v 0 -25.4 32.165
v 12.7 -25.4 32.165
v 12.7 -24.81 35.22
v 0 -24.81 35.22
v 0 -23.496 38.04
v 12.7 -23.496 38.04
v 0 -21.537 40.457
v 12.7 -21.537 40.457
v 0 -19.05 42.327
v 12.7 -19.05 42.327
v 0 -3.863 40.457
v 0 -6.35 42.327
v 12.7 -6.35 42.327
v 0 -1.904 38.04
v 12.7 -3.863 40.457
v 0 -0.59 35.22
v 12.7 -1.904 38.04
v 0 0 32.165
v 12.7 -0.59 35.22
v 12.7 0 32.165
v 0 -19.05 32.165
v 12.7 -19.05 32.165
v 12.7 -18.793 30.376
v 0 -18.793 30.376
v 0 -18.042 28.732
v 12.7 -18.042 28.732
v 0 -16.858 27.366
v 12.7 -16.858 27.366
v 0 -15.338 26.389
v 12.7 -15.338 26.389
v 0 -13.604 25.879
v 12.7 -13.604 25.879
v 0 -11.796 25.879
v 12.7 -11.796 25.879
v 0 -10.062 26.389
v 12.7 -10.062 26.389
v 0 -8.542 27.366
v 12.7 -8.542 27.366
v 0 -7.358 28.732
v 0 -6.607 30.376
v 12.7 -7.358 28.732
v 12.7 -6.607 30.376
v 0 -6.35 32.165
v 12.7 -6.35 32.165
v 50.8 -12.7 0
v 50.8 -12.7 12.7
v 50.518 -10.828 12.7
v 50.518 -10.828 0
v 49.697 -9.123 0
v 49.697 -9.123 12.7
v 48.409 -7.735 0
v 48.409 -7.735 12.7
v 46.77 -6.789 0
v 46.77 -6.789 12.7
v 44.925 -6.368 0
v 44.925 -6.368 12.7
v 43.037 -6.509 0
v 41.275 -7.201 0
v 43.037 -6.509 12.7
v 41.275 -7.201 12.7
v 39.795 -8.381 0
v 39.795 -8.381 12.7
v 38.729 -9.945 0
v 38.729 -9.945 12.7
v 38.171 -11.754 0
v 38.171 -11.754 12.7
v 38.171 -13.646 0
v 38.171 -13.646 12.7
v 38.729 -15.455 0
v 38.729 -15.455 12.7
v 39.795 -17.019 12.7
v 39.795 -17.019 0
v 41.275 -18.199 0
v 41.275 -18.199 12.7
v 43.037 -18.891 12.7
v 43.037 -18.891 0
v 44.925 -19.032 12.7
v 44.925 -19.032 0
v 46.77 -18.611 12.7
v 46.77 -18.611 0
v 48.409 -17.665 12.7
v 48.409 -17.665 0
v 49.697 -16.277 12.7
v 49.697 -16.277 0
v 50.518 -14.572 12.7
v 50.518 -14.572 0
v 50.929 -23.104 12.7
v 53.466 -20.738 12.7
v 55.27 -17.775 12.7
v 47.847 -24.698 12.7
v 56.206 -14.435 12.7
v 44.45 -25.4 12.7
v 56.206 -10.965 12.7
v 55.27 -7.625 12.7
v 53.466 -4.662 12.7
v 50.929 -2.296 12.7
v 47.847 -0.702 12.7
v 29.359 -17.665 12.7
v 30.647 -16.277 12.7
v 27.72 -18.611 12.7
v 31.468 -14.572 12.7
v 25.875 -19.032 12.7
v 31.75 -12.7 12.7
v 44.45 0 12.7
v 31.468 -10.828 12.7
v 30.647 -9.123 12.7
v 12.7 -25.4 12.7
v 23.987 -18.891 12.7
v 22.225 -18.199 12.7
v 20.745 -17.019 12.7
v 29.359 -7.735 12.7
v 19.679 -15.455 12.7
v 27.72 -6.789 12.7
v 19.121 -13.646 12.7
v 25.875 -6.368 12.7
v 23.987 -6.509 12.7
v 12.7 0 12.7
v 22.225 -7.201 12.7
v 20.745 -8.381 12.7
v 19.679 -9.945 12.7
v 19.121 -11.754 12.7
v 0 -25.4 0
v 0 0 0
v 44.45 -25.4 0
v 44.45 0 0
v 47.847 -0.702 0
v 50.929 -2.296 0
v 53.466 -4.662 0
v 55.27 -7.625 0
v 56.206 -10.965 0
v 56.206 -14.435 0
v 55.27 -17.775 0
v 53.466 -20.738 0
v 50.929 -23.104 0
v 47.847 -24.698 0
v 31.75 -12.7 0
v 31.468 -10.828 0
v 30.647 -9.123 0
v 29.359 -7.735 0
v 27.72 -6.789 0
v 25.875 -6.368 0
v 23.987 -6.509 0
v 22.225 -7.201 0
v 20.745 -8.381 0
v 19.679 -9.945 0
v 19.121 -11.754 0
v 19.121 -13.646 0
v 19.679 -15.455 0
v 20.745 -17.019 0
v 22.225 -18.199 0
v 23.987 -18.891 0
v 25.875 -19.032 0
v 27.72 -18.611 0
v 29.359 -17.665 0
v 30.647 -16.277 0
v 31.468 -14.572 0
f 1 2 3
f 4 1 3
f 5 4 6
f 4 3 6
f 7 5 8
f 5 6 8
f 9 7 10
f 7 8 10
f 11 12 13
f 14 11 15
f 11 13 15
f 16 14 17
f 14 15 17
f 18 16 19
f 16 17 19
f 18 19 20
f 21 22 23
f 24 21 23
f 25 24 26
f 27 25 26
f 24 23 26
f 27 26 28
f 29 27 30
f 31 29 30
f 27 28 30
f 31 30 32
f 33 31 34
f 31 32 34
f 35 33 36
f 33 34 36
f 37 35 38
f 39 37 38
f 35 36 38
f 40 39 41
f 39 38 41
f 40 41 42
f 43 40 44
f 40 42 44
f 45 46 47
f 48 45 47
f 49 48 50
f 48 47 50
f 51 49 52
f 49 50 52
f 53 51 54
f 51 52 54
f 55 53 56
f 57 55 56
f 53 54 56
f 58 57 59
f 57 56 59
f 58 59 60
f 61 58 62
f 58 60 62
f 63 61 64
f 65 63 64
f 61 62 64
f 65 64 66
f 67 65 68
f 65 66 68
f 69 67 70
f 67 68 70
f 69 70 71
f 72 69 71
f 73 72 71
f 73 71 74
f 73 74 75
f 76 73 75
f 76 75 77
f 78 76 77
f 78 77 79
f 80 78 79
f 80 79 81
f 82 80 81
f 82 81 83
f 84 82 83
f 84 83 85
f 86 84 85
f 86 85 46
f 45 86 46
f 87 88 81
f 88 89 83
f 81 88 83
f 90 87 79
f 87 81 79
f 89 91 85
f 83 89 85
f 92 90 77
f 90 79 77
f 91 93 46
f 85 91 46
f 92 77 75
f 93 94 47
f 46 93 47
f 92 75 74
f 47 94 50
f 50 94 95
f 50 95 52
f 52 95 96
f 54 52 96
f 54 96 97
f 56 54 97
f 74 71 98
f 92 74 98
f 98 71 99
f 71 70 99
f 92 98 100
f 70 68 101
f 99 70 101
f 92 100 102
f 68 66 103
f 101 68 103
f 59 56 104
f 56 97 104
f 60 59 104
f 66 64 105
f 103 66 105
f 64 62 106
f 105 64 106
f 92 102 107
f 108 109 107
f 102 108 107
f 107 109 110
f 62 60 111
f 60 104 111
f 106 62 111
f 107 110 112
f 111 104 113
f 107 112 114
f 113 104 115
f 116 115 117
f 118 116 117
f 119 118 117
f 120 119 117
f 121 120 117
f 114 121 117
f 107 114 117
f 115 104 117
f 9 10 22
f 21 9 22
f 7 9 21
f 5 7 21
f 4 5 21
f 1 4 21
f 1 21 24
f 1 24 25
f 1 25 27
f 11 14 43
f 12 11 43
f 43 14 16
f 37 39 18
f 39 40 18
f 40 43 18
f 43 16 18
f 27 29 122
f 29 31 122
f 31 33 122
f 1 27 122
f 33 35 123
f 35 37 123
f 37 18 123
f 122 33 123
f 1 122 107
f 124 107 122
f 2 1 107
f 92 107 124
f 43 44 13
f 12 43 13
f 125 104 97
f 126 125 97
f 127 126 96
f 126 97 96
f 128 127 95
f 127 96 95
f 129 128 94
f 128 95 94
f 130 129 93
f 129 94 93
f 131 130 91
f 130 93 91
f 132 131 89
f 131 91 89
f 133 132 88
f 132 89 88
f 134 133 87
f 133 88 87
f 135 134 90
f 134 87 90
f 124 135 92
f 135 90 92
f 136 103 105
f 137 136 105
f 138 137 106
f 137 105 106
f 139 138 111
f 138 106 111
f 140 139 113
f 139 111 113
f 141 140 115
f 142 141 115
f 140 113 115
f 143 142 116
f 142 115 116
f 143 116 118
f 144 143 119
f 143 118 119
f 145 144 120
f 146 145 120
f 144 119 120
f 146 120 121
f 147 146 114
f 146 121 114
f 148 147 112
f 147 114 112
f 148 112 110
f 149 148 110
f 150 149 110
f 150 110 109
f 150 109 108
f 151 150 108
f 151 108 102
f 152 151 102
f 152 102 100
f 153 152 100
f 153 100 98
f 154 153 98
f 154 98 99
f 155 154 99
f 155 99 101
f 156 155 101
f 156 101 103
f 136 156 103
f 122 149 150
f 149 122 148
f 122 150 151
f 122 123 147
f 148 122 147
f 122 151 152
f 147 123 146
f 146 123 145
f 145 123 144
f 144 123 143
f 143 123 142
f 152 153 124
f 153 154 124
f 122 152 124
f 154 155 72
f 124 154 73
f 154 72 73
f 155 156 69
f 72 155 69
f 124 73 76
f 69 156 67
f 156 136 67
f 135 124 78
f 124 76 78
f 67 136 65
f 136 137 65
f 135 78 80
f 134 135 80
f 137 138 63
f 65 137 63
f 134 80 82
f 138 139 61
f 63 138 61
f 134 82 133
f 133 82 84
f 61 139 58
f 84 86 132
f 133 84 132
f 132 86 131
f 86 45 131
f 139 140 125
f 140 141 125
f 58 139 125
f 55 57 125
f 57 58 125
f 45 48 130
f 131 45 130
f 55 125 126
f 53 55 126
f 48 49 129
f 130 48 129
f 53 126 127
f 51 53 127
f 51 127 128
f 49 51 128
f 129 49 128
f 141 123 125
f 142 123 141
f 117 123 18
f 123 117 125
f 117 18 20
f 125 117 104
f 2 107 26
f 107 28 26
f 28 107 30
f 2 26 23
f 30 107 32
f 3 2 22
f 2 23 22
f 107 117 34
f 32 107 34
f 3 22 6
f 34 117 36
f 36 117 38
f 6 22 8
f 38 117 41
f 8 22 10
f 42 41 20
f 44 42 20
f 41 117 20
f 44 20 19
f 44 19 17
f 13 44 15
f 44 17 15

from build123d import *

# Parameters (mm, degrees)
F1_DEPTH = 25.4
F3_DEPTH = 25.4
F4_R     = 6.35
F5_DEPTH = 25.4


with BuildPart() as f1:
    # F0 (on Front) → F1 (new body)
    with BuildSketch(Plane.XZ):
        Polygon((0, 44.45), (0, 0), (57.15, 0), (57.15, 12.7), (12.7, 12.7), (12.7, 44.45), align=None)
    extrude(amount=F1_DEPTH)

    # F2 (on face) → F3 (cut)
    with BuildSketch(Plane.YZ.offset(12.7)):
        with BuildLine():
            ThreePointArc((-25.4, 32.1648232639), (-23.4956230285, 38.0400795664), (-19.05, 42.3274708663))
            Line((-19.05, 42.3274708663), (-19.05, 44.45))
            Line((-19.05, 44.45), (-25.4, 44.45))
            Line((-25.4, 44.45), (-25.4, 32.1648232639))
        make_face()
        with BuildLine():
            ThreePointArc((-19.05, 32.1648232639), (-12.7, 38.5148232639), (-6.35, 32.1648232639))
            Line((-6.35, 32.1648232639), (-6.35, 42.3274708663))
            ThreePointArc((-6.35, 42.3274708663), (-12.7, 44.0243544316), (-19.05, 42.3274708663))
            Line((-19.05, 42.3274708663), (-19.05, 32.1648232639))
        make_face()
        with BuildLine():
            ThreePointArc((-19.05, 42.3274708663), (-12.7, 44.0243544316), (-6.35, 42.3274708663))
            Line((-6.35, 42.3274708663), (-6.35, 44.45))
            Line((-6.35, 44.45), (-19.05, 44.45))
            Line((-19.05, 44.45), (-19.05, 42.3274708663))
        make_face()
        with BuildLine():
            ThreePointArc((-19.05, 32.1648232639), (-12.7, 25.8148232639), (-6.35, 32.1648232639))
            ThreePointArc((-6.35, 32.1648232639), (-12.7, 38.5148232639), (-19.05, 32.1648232639))
        make_face()
        with BuildLine():
            Line((-6.35, 44.45), (-6.35, 42.3274708663))
            ThreePointArc((-6.35, 42.3274708663), (-1.9043769715, 38.0400795664), (0, 32.1648232639))
            Line((0, 32.1648232639), (0, 44.45))
            Line((0, 44.45), (-6.35, 44.45))
        make_face()
    extrude(amount=-F3_DEPTH, mode=Mode.SUBTRACT)

    # F4 (on face) → F5 (cut)
    with BuildSketch(Plane.XY.offset(12.7)):
        with Locations((25.4, -12.7)):
            Circle(F4_R)
        with Locations((44.45, -12.7)):
            Circle(F4_R)
        with BuildLine():
            ThreePointArc((44.45, 0), (56.3249263826, -12.7), (44.45, -25.4))
            Line((44.45, -25.4), (57.15, -25.4))
            Line((57.15, -25.4), (57.15, 0))
            Line((57.15, 0), (44.45, 0))
        make_face()
    extrude(amount=-F5_DEPTH, mode=Mode.SUBTRACT)


solid = f1.part
